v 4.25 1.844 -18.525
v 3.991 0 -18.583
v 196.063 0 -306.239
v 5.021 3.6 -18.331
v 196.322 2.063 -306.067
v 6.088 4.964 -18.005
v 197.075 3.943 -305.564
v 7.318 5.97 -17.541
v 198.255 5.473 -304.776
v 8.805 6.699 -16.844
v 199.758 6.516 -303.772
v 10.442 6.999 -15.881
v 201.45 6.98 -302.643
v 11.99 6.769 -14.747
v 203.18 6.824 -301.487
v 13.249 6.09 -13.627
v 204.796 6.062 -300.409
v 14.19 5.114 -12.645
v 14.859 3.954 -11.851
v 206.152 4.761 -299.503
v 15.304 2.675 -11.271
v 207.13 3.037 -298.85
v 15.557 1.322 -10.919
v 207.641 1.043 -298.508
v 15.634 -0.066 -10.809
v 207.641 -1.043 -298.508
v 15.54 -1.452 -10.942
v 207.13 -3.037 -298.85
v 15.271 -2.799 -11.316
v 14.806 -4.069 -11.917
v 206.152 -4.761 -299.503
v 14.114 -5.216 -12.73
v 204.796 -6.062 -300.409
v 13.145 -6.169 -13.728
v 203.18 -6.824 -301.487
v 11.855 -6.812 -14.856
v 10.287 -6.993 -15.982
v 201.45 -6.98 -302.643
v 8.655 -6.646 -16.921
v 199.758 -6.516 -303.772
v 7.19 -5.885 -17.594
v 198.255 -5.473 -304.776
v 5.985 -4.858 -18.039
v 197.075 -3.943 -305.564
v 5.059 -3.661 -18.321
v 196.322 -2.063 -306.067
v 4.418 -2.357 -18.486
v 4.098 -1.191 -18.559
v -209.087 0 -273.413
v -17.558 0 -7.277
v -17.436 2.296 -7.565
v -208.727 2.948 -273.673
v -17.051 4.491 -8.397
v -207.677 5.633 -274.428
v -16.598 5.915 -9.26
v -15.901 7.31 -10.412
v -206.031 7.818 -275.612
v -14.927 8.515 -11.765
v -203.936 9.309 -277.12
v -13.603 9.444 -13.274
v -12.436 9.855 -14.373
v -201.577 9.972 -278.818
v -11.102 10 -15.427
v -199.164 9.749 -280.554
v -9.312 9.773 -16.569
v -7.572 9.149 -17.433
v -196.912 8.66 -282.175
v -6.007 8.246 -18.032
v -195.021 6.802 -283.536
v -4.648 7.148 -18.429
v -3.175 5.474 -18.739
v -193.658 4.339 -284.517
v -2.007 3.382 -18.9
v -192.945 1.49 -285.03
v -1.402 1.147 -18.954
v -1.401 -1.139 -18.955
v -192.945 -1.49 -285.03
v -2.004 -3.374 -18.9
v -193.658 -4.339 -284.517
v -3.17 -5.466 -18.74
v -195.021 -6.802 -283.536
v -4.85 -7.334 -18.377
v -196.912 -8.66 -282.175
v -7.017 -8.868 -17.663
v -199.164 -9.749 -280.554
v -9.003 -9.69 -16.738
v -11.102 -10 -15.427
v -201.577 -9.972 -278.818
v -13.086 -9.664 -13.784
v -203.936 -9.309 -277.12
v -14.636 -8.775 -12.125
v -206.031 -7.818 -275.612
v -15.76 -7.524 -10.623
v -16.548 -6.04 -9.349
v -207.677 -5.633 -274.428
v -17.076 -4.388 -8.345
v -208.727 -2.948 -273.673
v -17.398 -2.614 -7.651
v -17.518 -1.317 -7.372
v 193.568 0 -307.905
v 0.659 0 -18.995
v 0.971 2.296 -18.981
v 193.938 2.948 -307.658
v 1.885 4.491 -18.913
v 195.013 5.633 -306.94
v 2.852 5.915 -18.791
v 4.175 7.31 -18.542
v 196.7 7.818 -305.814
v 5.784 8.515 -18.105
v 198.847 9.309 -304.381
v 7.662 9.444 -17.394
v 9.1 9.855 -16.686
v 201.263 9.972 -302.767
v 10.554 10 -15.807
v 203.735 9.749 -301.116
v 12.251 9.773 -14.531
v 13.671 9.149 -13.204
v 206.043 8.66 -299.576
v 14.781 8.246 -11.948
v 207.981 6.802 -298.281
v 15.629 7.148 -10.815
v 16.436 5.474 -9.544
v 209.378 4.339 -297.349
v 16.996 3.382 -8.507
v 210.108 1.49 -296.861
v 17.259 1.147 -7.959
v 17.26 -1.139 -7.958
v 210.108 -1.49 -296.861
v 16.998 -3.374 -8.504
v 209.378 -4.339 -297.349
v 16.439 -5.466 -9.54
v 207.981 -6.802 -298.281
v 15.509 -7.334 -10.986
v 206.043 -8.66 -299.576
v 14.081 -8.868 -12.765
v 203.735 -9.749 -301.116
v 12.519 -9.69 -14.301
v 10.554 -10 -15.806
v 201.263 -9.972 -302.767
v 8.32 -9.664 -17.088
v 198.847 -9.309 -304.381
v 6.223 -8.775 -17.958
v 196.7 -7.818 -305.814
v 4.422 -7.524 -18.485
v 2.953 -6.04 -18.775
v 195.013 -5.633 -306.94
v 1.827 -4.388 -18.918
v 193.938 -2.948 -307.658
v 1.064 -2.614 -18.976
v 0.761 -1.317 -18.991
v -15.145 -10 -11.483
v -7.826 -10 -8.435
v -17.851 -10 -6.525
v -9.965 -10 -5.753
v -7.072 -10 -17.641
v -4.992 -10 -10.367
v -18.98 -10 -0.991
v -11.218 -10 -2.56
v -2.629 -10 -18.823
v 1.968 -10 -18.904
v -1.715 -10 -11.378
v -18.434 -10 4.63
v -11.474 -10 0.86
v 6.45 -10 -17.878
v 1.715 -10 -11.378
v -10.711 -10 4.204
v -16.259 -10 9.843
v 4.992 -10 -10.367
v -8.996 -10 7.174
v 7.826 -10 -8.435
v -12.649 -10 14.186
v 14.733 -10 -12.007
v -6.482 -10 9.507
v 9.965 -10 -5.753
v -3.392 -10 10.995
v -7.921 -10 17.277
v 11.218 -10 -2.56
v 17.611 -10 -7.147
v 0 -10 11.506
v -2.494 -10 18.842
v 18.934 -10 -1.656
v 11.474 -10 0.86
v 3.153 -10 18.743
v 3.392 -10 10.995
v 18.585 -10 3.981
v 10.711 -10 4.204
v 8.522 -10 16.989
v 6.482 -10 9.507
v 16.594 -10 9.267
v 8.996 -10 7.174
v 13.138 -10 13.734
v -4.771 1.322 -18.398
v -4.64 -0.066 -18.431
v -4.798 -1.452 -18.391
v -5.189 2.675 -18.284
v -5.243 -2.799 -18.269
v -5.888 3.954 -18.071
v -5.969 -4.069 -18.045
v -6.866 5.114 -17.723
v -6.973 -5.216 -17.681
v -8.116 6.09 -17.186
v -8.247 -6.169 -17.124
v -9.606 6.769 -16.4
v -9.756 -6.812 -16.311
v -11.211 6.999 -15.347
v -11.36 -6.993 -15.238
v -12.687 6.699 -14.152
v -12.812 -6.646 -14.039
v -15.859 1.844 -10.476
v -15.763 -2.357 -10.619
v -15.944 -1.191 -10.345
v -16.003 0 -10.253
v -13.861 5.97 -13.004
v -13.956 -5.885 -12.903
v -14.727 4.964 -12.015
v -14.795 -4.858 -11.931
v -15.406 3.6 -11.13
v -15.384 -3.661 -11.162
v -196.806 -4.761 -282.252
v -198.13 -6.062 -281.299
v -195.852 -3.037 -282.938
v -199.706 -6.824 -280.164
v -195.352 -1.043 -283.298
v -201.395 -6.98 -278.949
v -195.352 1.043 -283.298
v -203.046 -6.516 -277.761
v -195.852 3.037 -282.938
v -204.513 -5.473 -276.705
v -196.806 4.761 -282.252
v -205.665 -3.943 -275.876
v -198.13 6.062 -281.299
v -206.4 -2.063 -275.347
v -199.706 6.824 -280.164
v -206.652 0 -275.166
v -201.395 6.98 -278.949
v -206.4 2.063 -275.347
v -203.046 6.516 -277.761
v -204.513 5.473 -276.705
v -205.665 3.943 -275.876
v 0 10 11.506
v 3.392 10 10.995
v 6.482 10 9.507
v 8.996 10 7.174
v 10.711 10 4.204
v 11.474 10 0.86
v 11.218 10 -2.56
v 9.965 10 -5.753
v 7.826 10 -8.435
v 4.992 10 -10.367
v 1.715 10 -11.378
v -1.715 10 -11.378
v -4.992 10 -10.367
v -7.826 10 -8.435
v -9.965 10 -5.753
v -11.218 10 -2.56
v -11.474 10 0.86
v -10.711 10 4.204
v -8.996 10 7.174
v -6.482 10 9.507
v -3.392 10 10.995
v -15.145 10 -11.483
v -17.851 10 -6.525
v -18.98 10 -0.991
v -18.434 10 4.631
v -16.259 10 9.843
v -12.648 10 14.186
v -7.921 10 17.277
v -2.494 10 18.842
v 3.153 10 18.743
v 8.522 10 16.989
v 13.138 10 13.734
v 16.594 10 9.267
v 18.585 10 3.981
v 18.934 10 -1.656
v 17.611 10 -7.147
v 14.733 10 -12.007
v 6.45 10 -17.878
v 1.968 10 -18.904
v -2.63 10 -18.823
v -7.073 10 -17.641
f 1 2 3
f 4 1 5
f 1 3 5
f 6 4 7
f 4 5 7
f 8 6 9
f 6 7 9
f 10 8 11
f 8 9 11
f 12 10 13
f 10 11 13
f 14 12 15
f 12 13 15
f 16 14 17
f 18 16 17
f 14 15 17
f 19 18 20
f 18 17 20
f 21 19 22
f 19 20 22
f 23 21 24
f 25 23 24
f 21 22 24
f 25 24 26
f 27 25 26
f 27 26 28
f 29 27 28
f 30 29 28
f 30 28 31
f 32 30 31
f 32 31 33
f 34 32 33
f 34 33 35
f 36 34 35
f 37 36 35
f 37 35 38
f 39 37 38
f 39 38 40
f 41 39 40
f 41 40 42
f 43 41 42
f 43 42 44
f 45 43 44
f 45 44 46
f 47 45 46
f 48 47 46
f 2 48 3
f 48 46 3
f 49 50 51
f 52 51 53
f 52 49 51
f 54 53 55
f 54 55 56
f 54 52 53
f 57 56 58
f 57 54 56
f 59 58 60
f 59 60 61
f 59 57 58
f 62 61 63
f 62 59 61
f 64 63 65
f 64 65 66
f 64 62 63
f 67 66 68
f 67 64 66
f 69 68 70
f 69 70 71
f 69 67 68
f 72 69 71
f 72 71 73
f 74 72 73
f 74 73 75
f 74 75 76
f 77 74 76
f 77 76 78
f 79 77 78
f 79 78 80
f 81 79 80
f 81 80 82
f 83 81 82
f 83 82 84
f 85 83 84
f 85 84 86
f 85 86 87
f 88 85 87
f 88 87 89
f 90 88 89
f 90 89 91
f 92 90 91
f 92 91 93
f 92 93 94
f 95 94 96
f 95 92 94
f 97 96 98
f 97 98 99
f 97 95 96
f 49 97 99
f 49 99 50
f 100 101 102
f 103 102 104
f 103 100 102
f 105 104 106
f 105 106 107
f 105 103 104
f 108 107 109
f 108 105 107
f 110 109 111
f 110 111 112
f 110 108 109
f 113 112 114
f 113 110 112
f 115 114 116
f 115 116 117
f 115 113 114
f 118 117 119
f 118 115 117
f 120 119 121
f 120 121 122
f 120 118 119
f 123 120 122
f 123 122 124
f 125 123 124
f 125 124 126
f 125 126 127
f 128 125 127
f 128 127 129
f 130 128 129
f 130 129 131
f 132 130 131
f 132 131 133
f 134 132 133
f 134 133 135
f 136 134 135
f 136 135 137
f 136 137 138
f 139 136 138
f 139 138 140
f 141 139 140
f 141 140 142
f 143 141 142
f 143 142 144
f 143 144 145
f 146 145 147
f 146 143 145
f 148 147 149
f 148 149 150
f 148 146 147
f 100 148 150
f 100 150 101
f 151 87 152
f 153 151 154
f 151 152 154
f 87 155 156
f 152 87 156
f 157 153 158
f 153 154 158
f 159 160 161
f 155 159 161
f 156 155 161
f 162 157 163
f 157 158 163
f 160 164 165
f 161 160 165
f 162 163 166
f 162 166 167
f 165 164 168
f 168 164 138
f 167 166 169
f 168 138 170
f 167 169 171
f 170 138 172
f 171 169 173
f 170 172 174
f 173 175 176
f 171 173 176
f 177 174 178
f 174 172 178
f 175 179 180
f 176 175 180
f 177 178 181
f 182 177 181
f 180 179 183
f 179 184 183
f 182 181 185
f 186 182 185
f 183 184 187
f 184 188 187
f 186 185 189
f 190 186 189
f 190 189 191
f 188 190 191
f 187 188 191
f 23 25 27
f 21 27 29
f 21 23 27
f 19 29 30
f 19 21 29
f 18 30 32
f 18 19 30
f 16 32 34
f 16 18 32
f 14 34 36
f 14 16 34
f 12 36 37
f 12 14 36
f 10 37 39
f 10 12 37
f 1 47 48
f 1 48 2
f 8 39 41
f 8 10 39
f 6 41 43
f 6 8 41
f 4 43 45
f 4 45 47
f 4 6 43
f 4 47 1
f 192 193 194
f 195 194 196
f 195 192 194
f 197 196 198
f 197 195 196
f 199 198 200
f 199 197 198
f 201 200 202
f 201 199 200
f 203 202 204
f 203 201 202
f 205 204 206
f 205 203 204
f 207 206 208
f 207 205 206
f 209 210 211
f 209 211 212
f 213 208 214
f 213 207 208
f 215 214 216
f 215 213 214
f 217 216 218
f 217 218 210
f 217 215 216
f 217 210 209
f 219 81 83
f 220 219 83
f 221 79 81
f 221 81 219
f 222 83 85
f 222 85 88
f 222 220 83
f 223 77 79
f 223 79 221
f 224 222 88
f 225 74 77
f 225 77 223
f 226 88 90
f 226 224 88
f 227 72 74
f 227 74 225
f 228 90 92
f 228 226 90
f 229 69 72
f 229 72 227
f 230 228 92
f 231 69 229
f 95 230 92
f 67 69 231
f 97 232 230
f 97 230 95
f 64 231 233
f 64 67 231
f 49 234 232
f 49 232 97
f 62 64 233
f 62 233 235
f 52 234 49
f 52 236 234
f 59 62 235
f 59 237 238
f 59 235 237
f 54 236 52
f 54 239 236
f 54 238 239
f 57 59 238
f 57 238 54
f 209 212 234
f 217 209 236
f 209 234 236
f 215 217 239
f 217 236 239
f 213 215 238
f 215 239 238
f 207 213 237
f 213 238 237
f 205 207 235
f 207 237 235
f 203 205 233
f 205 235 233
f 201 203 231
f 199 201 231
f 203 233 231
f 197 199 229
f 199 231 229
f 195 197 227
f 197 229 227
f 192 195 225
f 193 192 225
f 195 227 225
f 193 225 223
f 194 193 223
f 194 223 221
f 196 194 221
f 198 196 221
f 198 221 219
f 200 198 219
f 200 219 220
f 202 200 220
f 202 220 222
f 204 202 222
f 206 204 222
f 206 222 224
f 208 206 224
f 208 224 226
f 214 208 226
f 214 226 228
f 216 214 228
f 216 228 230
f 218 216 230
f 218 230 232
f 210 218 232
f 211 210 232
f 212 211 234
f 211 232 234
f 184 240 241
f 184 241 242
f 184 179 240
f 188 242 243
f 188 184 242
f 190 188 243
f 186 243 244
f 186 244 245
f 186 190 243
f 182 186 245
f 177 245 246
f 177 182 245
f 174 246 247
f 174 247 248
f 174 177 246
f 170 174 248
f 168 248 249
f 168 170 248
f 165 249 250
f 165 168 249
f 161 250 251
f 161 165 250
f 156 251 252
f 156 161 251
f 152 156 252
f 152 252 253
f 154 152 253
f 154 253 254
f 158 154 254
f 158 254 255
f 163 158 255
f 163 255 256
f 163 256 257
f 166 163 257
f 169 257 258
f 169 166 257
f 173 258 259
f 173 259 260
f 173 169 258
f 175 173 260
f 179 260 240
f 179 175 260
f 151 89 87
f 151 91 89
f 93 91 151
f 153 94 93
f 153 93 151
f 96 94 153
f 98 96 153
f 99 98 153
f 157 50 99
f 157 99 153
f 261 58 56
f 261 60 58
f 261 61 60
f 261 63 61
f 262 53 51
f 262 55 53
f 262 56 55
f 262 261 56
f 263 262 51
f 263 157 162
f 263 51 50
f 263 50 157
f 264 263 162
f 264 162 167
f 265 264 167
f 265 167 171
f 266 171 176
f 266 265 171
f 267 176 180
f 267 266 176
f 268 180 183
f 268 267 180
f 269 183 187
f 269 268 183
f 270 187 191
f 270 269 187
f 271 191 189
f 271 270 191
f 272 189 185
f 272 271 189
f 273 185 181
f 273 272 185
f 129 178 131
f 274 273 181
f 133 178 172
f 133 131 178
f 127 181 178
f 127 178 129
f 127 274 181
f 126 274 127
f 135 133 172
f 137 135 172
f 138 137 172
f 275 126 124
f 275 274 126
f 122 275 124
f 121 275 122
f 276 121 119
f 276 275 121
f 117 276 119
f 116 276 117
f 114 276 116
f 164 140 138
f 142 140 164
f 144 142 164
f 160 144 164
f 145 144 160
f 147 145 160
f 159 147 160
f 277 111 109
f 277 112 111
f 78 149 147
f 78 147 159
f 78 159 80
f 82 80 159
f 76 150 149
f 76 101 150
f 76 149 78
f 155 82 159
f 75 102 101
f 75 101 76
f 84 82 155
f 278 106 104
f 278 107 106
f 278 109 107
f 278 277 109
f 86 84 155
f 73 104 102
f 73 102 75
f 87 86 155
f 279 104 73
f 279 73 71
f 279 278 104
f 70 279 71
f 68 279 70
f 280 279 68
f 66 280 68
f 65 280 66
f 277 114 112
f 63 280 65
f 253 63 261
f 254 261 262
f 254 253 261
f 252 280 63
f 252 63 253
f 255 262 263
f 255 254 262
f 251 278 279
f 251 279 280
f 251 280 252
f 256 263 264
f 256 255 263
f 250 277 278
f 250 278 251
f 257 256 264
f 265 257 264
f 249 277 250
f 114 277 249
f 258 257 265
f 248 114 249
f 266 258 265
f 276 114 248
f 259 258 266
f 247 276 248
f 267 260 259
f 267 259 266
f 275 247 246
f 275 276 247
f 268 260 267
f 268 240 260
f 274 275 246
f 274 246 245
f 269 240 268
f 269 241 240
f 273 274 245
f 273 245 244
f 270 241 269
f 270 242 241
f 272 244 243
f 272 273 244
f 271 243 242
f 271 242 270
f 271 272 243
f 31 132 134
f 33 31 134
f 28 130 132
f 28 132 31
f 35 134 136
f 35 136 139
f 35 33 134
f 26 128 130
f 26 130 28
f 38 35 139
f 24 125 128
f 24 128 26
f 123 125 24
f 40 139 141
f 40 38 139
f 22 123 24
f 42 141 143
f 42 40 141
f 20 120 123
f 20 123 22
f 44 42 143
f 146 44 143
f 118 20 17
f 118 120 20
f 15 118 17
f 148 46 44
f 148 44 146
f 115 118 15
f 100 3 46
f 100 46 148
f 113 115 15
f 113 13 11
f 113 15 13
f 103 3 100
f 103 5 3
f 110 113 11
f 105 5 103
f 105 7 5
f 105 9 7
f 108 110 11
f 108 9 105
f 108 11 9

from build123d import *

# Parameters (mm, degrees)
SKETCH1_R                = 19.0062
SKETCH1_R_2              = 11.5062
BOSS_EXTRUDE1_DEPTH      = 10
BOSS_EXTRUDE2_REACH      = 392.082
BOSS_EXTRUDE2_END_RADIUS = 19.0062
SKETCH5_R                = 10
SKETCH5_R_2              = 7
BOSS_EXTRUDE3_REACH      = 510.057
BOSS_EXTRUDE3_END_RADIUS = 19.0062
SKETCH6_R                = 10
SKETCH6_R_2              = 7


with BuildPart() as part:
    # Sketch1 → Boss-Extrude1 (new, symmetric)
    with BuildSketch(Plane(origin=(0, 0, 0), x_dir=(1, 0, 0), z_dir=(0, 1, 0))):
        with Locations(Location((0, 0, 0), (0, 0, 270))):
            Circle(SKETCH1_R)
        with Locations(Location((0, 0, 0), (0, 0, 270))):
            Circle(SKETCH1_R_2, mode=Mode.SUBTRACT)
    extrude(amount=BOSS_EXTRUDE1_DEPTH, both=True)

    # Boss-Extrude2: up to this cylinder (the profile starts outside it)
    boss_extrude2_end = Plane(origin=(0, 0, 0), z_dir=(0, -1, 0)) * Cylinder(BOSS_EXTRUDE2_END_RADIUS, 823.1764, mode=Mode.PRIVATE)
    # Sketch5 → Boss-Extrude2 (add, up to the surface)
    with BuildSketch(Plane(origin=(201.884851726, 0, -302.352155823), x_dir=(0.8316479627965052, 0, 0.555303219850581), z_dir=(0.555303219850581, 0, -0.8316479627965052)), mode=Mode.PRIVATE) as boss_extrude2_sk1:
        with Locations(Location((0, 0, 0), (0, 0, 180))):
            Circle(SKETCH5_R)
        with Locations(Location((0, 0, 0), (0, 0, 180))):
            Circle(SKETCH5_R_2, mode=Mode.SUBTRACT)
    boss_extrude2_tool1 = extrude(boss_extrude2_sk1.sketch, amount=-BOSS_EXTRUDE2_REACH, mode=Mode.PRIVATE) - boss_extrude2_end
    add(boss_extrude2_tool1.solids().sort_by_distance((209.966106, 0, -296.956187))[0])

    # Boss-Extrude3: up to this cylinder (the profile starts outside it)
    boss_extrude3_end = Plane(origin=(0, 0, 0), z_dir=(0, -1, 0)) * Cylinder(BOSS_EXTRUDE3_END_RADIUS, 1059.1264, mode=Mode.PRIVATE)
    # Sketch6 → Boss-Extrude3 (add, up to the surface)
    with BuildSketch(Plane(origin=(-200.97050419, 0, -279.254437795), x_dir=(-0.811662071535183, 0, 0.5841272820466578), z_dir=(-0.5841272820466578, 0, -0.811662071535183)), mode=Mode.PRIVATE) as boss_extrude3_sk1:
        Circle(SKETCH6_R)
        Circle(SKETCH6_R_2, mode=Mode.SUBTRACT)
    boss_extrude3_tool1 = extrude(boss_extrude3_sk1.sketch, amount=-BOSS_EXTRUDE3_REACH, mode=Mode.PRIVATE) - boss_extrude3_end
    add(boss_extrude3_tool1.solids().sort_by_distance((-193.083456, 0, -284.930494))[0])


solid = part.part
